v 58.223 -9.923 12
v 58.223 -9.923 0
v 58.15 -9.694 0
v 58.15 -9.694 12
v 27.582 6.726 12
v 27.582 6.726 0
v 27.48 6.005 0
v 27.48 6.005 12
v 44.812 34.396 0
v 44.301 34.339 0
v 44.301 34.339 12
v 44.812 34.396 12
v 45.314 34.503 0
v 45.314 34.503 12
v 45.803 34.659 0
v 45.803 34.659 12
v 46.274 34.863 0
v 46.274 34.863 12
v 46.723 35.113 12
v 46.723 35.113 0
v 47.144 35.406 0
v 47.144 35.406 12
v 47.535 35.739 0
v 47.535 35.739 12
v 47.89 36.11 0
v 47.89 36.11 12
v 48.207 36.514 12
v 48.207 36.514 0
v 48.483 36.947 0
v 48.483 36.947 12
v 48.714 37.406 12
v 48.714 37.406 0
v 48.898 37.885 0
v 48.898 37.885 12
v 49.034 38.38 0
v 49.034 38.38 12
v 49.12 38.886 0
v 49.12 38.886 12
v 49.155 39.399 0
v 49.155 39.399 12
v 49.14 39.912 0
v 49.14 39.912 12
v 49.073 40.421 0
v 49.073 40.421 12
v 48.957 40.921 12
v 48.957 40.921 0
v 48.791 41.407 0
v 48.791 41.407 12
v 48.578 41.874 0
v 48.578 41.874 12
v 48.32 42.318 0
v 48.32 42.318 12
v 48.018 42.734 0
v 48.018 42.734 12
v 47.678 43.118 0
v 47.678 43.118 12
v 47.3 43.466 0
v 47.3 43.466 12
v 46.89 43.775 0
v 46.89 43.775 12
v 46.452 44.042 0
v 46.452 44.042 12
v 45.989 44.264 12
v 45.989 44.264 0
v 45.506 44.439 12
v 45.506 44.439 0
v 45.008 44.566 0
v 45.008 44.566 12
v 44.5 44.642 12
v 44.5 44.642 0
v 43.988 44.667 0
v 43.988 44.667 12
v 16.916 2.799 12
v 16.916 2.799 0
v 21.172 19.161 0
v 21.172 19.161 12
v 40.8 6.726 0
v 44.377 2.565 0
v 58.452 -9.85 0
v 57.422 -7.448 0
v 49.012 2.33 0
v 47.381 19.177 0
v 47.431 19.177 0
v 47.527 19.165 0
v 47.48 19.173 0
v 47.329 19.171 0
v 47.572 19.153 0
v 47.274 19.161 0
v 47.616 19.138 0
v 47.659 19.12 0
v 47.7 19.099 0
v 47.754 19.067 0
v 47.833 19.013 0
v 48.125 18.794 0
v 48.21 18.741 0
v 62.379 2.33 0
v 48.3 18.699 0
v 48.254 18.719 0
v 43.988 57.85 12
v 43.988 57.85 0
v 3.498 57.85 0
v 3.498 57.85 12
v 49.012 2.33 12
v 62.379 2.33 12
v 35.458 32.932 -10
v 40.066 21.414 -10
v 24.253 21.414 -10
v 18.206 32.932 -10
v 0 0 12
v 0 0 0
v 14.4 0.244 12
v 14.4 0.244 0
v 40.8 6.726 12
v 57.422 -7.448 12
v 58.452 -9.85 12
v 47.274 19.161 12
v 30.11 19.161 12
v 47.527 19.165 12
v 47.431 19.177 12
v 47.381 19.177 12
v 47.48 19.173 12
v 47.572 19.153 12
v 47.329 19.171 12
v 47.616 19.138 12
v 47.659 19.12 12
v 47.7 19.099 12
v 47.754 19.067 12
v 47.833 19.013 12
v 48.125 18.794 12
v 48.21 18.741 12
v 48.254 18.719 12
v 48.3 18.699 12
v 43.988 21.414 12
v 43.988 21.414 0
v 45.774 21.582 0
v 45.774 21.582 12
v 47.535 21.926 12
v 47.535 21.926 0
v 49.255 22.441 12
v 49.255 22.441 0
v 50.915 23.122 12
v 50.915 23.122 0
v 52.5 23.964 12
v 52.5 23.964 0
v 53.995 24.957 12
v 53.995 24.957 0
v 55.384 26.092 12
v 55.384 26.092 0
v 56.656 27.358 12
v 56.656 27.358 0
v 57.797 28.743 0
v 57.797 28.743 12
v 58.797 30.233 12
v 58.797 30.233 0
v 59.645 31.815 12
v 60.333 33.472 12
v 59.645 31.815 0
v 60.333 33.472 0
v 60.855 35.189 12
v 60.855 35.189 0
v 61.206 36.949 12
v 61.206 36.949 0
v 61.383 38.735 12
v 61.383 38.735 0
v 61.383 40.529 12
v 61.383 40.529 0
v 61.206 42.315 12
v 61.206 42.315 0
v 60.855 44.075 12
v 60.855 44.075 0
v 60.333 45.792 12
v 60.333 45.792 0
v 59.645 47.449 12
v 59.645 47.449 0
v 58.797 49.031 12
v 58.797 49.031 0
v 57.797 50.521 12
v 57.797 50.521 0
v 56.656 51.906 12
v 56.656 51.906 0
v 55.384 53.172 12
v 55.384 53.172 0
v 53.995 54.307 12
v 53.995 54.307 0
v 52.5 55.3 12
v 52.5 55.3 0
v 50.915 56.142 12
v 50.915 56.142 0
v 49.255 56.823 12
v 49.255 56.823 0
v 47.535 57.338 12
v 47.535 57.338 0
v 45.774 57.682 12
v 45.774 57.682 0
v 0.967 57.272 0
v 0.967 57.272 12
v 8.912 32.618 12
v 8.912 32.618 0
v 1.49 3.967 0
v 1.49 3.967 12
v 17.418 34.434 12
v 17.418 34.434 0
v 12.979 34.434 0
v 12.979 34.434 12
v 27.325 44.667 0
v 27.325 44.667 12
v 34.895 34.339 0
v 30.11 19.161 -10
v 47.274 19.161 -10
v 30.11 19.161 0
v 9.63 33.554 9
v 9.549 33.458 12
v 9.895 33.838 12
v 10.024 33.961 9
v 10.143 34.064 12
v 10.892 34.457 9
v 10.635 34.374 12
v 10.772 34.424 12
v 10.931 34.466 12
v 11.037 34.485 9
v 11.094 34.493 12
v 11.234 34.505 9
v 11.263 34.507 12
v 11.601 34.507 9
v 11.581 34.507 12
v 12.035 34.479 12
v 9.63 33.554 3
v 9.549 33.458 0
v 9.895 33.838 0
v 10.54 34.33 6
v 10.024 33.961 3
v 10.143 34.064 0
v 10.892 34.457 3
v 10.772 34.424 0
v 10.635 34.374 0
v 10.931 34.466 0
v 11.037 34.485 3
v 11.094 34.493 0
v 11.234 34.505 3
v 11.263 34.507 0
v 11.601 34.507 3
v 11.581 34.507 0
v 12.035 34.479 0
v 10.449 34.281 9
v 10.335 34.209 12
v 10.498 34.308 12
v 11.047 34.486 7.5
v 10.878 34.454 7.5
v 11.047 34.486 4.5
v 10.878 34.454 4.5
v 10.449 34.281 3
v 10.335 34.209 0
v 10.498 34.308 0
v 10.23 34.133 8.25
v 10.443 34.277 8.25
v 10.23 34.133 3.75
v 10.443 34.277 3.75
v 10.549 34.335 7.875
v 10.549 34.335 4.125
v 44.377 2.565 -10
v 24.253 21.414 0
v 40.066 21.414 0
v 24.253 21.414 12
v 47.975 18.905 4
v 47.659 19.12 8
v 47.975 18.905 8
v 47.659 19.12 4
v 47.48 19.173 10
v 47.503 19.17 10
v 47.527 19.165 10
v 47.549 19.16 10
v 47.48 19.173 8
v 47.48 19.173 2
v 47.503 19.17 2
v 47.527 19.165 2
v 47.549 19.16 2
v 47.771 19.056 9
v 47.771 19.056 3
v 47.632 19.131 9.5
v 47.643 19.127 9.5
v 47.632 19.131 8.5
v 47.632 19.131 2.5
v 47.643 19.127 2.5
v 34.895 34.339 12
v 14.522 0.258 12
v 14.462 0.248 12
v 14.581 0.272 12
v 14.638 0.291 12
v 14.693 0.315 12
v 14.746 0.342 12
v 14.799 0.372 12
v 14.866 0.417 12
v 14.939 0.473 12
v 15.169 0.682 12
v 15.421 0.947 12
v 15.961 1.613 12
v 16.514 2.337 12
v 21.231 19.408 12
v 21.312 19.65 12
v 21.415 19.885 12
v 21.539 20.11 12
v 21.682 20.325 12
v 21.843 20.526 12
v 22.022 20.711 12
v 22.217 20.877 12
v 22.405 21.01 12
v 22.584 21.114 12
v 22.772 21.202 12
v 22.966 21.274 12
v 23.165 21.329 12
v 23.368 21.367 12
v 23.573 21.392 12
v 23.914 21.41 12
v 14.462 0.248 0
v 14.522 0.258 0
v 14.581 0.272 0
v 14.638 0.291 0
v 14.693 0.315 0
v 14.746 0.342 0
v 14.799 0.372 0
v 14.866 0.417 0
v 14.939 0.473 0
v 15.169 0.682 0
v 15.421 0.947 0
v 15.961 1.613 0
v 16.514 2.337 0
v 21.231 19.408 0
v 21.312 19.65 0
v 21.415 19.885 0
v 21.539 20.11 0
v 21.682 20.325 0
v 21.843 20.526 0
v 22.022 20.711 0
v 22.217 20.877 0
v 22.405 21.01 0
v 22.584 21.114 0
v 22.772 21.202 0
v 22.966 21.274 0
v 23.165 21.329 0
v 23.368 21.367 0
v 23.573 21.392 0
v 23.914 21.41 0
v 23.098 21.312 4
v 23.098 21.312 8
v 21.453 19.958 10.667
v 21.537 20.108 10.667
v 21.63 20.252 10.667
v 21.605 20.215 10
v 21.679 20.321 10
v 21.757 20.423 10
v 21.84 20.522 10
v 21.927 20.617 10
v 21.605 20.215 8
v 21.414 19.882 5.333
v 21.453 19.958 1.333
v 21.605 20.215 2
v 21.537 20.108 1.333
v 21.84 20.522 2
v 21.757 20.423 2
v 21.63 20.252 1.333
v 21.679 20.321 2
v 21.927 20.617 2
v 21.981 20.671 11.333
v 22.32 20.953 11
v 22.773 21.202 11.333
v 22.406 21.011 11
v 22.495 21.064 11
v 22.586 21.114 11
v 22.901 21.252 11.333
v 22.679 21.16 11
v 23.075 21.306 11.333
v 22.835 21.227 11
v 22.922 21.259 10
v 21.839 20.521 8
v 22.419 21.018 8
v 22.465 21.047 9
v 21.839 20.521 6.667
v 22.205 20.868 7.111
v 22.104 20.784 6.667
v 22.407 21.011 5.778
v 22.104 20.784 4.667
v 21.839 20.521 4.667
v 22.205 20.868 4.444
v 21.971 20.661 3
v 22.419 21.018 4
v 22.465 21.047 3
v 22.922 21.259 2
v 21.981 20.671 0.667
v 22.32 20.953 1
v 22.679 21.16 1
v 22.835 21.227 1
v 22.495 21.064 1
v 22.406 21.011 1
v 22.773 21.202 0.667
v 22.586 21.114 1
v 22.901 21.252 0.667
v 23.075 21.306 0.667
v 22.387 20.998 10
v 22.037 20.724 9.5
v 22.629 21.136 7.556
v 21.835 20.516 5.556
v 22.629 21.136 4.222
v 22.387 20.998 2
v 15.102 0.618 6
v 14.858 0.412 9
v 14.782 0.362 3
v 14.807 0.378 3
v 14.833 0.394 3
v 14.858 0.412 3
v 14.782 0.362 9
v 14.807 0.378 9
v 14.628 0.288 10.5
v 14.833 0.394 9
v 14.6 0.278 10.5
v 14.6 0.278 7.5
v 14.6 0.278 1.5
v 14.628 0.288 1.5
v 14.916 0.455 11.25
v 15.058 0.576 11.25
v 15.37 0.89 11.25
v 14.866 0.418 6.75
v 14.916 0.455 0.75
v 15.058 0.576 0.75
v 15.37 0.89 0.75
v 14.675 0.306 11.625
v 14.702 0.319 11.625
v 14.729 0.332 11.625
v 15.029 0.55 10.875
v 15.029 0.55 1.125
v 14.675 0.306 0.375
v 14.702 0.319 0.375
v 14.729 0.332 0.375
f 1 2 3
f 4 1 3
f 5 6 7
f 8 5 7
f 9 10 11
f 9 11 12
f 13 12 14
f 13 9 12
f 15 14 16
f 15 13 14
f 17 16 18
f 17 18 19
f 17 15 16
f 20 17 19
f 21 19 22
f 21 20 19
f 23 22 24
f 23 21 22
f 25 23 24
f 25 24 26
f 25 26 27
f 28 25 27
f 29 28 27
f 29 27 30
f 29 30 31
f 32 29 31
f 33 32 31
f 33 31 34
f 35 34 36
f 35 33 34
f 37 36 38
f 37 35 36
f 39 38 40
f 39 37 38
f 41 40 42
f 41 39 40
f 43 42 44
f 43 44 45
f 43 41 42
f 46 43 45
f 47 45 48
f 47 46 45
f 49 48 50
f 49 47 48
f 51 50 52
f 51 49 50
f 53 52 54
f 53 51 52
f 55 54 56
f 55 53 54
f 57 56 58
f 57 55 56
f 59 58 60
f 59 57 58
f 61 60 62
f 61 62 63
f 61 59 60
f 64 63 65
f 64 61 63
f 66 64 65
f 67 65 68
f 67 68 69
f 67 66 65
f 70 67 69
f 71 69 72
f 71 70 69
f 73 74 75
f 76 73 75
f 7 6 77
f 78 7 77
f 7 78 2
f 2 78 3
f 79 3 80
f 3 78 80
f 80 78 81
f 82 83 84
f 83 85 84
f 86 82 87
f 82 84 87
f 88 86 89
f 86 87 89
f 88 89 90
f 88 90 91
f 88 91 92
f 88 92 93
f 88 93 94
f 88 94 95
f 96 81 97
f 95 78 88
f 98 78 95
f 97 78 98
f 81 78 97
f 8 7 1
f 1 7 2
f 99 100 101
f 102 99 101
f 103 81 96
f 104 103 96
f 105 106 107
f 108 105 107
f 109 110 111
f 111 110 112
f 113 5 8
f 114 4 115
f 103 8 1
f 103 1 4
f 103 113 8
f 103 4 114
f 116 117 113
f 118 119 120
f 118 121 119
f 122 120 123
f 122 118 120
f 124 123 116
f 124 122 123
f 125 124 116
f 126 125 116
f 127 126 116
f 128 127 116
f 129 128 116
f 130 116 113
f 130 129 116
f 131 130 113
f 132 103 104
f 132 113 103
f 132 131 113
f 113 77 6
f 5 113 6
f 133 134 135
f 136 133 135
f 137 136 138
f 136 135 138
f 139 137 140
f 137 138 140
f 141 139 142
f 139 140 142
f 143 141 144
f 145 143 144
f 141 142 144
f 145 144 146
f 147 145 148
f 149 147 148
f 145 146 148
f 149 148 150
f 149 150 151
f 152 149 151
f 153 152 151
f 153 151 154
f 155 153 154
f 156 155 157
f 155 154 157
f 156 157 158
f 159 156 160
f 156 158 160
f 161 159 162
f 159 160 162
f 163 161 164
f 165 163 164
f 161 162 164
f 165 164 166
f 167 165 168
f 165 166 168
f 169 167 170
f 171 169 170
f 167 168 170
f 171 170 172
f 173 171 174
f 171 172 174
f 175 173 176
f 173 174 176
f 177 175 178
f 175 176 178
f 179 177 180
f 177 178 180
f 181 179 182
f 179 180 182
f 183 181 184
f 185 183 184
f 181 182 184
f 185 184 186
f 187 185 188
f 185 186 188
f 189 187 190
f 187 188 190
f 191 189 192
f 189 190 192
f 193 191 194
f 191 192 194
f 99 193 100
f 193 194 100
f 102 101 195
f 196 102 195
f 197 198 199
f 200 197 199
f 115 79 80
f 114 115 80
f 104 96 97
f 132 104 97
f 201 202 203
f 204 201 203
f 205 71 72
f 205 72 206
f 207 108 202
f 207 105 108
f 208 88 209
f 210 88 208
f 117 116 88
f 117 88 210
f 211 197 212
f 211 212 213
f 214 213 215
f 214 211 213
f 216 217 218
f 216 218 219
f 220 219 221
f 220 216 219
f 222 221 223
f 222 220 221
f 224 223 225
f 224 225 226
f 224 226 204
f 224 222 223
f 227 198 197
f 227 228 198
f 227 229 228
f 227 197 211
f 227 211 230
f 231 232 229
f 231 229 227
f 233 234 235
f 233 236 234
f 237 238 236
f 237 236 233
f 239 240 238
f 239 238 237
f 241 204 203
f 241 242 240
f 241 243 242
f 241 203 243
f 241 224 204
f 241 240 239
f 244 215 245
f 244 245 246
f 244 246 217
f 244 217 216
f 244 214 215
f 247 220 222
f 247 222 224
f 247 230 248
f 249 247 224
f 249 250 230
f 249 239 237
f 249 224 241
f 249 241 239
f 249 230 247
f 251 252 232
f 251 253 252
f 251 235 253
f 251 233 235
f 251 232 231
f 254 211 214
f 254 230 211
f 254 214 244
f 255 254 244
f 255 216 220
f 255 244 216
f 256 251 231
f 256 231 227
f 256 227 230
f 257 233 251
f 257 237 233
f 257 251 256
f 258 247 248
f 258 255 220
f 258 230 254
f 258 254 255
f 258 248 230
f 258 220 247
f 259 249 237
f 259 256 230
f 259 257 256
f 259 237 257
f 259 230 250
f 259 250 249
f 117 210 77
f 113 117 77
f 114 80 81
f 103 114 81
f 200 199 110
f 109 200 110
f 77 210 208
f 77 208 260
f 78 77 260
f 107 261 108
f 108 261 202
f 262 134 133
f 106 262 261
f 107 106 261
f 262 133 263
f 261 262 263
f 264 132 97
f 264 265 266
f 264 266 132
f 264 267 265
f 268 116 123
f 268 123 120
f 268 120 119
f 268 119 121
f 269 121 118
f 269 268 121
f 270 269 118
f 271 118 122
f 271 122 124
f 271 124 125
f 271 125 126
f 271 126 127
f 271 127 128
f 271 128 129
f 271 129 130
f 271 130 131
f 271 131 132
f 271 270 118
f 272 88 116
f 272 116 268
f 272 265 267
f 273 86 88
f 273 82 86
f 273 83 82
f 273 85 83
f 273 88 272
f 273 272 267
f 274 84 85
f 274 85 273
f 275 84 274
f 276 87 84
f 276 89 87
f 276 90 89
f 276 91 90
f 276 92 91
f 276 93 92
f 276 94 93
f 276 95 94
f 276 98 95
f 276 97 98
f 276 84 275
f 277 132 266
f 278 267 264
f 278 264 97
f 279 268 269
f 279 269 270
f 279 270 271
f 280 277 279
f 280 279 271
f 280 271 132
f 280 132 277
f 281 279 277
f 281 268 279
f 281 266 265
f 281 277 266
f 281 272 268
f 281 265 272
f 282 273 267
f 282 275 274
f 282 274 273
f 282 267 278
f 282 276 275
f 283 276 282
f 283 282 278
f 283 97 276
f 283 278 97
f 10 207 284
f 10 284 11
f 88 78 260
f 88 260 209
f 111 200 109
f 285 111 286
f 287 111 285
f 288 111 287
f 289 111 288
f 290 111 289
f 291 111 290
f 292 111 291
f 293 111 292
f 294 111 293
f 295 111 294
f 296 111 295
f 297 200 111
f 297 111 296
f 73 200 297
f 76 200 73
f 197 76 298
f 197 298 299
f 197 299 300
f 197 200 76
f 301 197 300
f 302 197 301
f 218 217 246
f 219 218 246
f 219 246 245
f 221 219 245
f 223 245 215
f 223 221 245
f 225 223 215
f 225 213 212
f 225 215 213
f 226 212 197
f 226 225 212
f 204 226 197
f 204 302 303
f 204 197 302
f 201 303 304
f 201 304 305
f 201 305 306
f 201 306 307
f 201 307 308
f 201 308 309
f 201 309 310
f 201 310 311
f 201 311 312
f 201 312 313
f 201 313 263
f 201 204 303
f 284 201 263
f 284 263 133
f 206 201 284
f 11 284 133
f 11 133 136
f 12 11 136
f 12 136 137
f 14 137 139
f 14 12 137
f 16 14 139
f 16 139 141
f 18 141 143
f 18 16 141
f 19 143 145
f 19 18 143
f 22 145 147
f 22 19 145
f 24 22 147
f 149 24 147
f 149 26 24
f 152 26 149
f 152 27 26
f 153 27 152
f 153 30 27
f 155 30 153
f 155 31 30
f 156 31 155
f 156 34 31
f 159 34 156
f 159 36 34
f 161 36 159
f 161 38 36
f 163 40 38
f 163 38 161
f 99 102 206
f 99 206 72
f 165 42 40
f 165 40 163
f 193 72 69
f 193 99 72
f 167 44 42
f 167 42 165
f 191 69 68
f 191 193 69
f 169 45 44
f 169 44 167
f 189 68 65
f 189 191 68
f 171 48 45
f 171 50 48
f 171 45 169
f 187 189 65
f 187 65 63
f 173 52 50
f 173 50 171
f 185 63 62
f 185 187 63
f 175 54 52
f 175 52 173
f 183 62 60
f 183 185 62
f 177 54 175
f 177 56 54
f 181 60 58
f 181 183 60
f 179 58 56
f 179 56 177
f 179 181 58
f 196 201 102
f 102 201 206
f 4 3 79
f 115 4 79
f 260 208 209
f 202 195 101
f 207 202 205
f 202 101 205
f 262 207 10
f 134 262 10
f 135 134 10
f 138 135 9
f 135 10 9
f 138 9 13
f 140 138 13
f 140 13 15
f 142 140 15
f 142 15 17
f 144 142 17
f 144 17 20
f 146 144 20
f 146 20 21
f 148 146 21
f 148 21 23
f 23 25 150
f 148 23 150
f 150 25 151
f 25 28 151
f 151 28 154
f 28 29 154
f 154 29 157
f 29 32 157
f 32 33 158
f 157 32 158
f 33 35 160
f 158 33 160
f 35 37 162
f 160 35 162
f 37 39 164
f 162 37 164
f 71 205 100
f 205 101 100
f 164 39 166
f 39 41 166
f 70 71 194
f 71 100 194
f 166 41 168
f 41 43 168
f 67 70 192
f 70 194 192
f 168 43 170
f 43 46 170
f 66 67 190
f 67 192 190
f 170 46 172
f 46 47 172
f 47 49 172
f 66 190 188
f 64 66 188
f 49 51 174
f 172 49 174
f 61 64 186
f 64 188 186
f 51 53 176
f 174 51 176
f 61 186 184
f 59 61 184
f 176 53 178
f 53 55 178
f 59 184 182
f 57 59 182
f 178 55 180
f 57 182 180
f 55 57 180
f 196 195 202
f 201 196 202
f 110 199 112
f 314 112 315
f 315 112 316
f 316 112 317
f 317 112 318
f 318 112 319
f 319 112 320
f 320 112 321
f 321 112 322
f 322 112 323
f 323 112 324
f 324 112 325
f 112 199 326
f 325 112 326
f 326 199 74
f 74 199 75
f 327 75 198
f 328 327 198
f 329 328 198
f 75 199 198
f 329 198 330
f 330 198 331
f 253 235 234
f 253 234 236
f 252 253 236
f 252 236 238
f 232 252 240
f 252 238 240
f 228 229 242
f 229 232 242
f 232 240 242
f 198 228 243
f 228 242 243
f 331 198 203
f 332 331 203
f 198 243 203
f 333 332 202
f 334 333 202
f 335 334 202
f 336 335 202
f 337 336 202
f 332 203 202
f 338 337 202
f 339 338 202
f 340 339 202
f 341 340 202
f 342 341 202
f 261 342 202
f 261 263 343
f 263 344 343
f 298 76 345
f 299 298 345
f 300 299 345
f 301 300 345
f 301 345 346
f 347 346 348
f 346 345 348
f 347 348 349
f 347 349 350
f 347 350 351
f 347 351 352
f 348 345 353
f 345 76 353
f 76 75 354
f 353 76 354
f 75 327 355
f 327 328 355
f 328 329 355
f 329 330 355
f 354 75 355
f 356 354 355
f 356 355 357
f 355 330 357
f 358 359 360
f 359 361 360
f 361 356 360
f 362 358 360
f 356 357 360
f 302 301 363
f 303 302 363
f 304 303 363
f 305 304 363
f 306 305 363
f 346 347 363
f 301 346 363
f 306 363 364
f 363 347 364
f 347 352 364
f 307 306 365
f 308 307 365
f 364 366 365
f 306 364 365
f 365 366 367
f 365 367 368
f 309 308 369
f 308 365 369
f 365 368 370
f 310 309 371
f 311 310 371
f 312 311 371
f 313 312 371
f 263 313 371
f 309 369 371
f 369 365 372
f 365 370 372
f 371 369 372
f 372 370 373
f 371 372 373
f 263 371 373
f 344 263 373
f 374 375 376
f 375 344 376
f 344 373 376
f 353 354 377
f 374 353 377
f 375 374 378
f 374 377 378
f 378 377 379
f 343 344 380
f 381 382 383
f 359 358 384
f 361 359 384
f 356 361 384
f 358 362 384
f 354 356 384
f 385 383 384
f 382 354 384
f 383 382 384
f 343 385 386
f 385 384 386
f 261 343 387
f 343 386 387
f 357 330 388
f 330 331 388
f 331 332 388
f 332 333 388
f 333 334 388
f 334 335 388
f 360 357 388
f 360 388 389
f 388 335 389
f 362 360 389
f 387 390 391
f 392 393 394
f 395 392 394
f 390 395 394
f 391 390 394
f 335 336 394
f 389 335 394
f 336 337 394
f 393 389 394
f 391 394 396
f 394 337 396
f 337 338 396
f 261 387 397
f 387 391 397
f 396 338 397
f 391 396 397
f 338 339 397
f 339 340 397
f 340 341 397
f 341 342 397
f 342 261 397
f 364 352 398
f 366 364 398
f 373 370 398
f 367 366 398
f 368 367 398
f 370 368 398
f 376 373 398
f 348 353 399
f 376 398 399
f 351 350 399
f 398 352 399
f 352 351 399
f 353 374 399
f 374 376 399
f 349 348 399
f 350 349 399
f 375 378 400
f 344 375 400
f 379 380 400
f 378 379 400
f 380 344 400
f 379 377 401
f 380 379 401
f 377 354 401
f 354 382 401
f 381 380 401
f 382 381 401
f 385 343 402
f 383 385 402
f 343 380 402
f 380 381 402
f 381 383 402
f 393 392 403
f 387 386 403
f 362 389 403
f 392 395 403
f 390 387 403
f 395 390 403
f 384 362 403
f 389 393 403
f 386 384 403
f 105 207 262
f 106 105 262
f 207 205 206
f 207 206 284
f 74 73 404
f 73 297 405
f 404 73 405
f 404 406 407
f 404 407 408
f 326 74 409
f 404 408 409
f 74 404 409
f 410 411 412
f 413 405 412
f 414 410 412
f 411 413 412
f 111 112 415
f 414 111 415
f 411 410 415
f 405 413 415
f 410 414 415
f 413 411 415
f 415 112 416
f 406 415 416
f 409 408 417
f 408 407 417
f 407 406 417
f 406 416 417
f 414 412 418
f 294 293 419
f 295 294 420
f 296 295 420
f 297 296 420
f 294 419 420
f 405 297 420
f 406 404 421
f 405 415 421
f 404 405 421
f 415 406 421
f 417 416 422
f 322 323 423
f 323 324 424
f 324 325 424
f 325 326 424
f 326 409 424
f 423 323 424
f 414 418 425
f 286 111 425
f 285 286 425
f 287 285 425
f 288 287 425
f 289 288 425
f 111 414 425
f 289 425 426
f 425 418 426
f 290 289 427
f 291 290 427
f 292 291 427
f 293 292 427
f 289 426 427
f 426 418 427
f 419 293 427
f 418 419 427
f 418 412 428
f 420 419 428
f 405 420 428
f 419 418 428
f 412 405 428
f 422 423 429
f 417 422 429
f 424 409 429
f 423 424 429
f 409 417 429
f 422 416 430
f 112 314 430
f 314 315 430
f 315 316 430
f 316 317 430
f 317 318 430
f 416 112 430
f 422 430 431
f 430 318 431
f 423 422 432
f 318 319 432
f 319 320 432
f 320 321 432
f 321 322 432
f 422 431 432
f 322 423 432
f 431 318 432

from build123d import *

# Parameters (mm, degrees)
EXTRUDE_1_DEPTH   = 5
EXTRUDE_1_2_DEPTH = 5
SCALE_3_SCALE     = 2
SCALE_4_SCALE     = 1.2
EXTRUDE_2_DEPTH   = 10


with BuildPart() as part:
    # 草图1 → 凸台-拉伸1 (new body)
    with BuildSketch(Plane.XY):
        with BuildLine():
            Line((0, 0), (6, 0.101807226))
            add(Edge.make_bspline(
                [(6, 0.101807226), (6.11703333, 0.103793032), (6.539331141, 0.445382193), (6.766853053, 0.870706022), (7.048380288, 1.166208583)],
                knots=[0, 0, 0, 0, 0.218980936, 1, 1, 1, 1], degree=3))
            Line((7.048380288, 1.166208583), (8.821569818, 7.983706688))
            add(Edge.make_bspline(
                [(8.821569818, 7.983706688), (8.880494845, 8.292718266), (9.133200384, 8.684107586), (9.674656455, 8.919540561), (9.945425552, 8.922373879), (10.105270187, 8.922373879)],
                knots=[0, 0, 0, 0, 0.545722685, 0.722751064, 1, 1, 1, 1], degree=3))
            Line((10.105270187, 8.922373879), (18.328135523, 8.922373879))
            ThreePointArc((18.328135523, 8.922373879), (25.585377637, 16.513323181), (18.328135523, 24.104272483))
            Line((18.328135523, 24.104272483), (1.457415265, 24.104272483))
            Line((1.457415265, 24.104272483), (0.402798811, 23.863217293))
            Line((0.402798811, 23.863217293), (7.257301052, 14.347574118))
            Line((7.257301052, 14.347574118), (5.407878695, 14.347574118))
            add(Edge.make_bspline(
                [(3.713540643, 13.590672305), (3.874120401, 13.814225479), (4.381582253, 14.534719233), (4.957975747, 14.347574118), (5.407878695, 14.347574118)],
                knots=[0, 0, 0, 0, 0.493224749, 1, 1, 1, 1], degree=3))
            Line((3.713540643, 13.590672305), (0.620905315, 1.652820835))
            Line((0.620905315, 1.652820835), (0, 0))
        make_face()
        with BuildLine():
            Line((11.385415133, 18.611449111), (14.539491637, 14.308084749))
            Line((14.539491637, 14.308084749), (18.458814961, 14.308084749))
            ThreePointArc((18.458814961, 14.308084749), (20.480809555, 16.52315261), (18.328135523, 18.611449111))
            Line((18.328135523, 18.611449111), (11.385415133, 18.611449111))
        make_face(mode=Mode.SUBTRACT)
    extrude(amount=EXTRUDE_1_DEPTH)


with BuildPart() as body_2:
    # 草图1 → Extrude 1 2 (new body)
    with BuildSketch(Plane.XY):
        with BuildLine():
            Line((12.54595398, 7.983706688), (17.000047973, 2.802413675))
            Line((17.000047973, 2.802413675), (11.581733222, 2.802413675))
            Line((11.581733222, 2.802413675), (11.492362709, 2.802413675))
            Line((11.492362709, 2.802413675), (11.450048683, 2.502081107))
            Line((11.450048683, 2.502081107), (24.259462505, -4.134416043))
            Line((24.259462505, -4.134416043), (24.229199468, -4.039081478))
            Line((24.229199468, -4.039081478), (24.354797069, -4.104153006))
            Line((24.354797069, -4.104153006), (23.925862862, -3.103289873))
            Line((23.925862862, -3.103289873), (20.421472701, 0.970915565))
            Line((20.421472701, 0.970915565), (25.991187435, 0.970915565))
            Line((25.991187435, 0.970915565), (20.124897042, 7.79106718))
            add(Edge.make_bspline(
                [(19.697641325, 7.983706688), (19.882658594, 8.02773802), (19.976864064, 7.850257316), (20.124897042, 7.79106718)],
                knots=[0, 0, 0, 0, 1, 1, 1, 1], degree=3))
            Line((19.697641325, 7.983706688), (12.54595398, 7.983706688))
        make_face()
    extrude(amount=EXTRUDE_1_2_DEPTH)


with BuildPart() as body_2_1:
    # 缩放比例3: scaled about (0, 0, 0)
    add(body_2.part.scale(SCALE_3_SCALE))


with BuildPart() as part_1:
    # 缩放比例3: scaled about (0, 0, 0)
    add(part.part.scale(SCALE_3_SCALE))


with BuildPart() as body_2_2:
    # 缩放比例4: scaled about (0, 0, 0)
    add(body_2_1.part.scale(SCALE_4_SCALE))


with BuildPart() as part_2:
    # 缩放比例4: scaled about (0, 0, 0)
    add(part_1.part.scale(SCALE_4_SCALE))


    add(body_2_2.part)  # 凸台-拉伸2 merges body 2
    # 草图2 → 凸台-拉伸2 (add)
    with BuildSketch(Plane(origin=(0, 0, 0), x_dir=(-1, 0, 0), z_dir=(0, 0, -1))):
        Polygon((-30.110289552, 19.160896051), (-44.376642336, 2.565342813), (-47.27433918, 19.160896051), align=None)
        Polygon((-40.066068009, 21.41369731), (-24.252648448, 21.41369731), (-17.417522526, 34.434177884), (-34.89477993, 34.339403398), align=None)
    extrude(amount=EXTRUDE_2_DEPTH)

    # 草图3 → 切除-放样1 section 0
    with BuildSketch(Plane(origin=(27.82574414, 14.607177054, 0), x_dir=(0, 0, 1), z_dir=(-0.8854154326833944, -0.4648005072782058, 0))):
        with BuildLine():
            Line((-10, 20.695761788), (0, 22.392879205))
            Line((0, 22.392879205), (-10, 22.392879205))
            Line((-10, 22.392879205), (-10, 20.695761788))
        make_face()
    # 草图4 → 切除-放样1 section 1
    with BuildSketch(Plane(origin=(41.92293393, 16.772435253, 0), x_dir=(0, 0, -1), z_dir=(0.9284517800893264, 0.3714529472880265, 0))):
        with BuildLine():
            Line((10, 17.404338088), (0, 18.920711362))
            Line((0, 18.920711362), (10, 18.920711362))
            Line((10, 18.920711362), (10, 17.404338088))
        make_face()
    loft(mode=Mode.SUBTRACT)


solid = part_2.part
